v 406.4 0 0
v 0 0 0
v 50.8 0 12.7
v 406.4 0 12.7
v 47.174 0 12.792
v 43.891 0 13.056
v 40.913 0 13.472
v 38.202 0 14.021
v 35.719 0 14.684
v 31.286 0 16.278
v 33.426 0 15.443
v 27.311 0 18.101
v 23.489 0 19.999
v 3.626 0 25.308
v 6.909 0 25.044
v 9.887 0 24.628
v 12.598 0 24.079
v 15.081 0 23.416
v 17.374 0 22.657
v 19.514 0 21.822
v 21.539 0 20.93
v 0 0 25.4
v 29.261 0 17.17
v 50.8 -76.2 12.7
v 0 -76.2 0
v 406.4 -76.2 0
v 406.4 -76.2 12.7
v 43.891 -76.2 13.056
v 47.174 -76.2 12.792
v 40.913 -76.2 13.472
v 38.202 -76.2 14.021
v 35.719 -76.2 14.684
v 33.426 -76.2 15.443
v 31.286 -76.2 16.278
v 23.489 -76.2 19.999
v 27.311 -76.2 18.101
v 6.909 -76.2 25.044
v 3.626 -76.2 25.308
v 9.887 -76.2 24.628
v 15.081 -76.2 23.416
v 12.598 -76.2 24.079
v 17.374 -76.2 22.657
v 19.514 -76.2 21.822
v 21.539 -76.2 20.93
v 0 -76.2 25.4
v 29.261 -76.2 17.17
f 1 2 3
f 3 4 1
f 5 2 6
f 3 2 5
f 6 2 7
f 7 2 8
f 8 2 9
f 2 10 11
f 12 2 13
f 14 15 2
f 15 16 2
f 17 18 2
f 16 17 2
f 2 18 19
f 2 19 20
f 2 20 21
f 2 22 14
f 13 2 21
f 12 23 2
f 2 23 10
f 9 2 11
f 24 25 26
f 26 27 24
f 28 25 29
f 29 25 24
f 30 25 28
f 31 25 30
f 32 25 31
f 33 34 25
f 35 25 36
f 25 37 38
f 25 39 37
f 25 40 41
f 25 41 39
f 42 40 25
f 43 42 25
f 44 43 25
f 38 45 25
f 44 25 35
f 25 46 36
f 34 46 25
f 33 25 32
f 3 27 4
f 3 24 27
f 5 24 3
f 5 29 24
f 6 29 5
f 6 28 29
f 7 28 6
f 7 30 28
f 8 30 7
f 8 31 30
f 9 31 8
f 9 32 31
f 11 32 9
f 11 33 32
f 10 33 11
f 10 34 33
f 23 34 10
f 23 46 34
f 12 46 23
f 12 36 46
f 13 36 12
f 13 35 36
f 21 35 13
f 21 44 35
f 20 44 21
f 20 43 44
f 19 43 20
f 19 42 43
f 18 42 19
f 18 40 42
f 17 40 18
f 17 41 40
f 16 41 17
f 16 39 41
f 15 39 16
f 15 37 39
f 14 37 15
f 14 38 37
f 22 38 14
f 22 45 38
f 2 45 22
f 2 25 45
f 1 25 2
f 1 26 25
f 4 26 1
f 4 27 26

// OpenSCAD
use <bezier.scad>;

width = 3*25.4;
length = 16*25.4;
height1 = 25.4;
height2 = 25.4/2;

delta = height1-height2;
top = [[0,height1],POLAR(2*delta,0),POLAR(2*delta,180),[4*delta,height2], SHARP(), SHARP(), [length,height2]];
echo(top);
side = concat(Bezier(top),[[length,0],[0,0]]);

//projection()
rotate([90,0,0]) linear_extrude(height=width) polygon(side);
